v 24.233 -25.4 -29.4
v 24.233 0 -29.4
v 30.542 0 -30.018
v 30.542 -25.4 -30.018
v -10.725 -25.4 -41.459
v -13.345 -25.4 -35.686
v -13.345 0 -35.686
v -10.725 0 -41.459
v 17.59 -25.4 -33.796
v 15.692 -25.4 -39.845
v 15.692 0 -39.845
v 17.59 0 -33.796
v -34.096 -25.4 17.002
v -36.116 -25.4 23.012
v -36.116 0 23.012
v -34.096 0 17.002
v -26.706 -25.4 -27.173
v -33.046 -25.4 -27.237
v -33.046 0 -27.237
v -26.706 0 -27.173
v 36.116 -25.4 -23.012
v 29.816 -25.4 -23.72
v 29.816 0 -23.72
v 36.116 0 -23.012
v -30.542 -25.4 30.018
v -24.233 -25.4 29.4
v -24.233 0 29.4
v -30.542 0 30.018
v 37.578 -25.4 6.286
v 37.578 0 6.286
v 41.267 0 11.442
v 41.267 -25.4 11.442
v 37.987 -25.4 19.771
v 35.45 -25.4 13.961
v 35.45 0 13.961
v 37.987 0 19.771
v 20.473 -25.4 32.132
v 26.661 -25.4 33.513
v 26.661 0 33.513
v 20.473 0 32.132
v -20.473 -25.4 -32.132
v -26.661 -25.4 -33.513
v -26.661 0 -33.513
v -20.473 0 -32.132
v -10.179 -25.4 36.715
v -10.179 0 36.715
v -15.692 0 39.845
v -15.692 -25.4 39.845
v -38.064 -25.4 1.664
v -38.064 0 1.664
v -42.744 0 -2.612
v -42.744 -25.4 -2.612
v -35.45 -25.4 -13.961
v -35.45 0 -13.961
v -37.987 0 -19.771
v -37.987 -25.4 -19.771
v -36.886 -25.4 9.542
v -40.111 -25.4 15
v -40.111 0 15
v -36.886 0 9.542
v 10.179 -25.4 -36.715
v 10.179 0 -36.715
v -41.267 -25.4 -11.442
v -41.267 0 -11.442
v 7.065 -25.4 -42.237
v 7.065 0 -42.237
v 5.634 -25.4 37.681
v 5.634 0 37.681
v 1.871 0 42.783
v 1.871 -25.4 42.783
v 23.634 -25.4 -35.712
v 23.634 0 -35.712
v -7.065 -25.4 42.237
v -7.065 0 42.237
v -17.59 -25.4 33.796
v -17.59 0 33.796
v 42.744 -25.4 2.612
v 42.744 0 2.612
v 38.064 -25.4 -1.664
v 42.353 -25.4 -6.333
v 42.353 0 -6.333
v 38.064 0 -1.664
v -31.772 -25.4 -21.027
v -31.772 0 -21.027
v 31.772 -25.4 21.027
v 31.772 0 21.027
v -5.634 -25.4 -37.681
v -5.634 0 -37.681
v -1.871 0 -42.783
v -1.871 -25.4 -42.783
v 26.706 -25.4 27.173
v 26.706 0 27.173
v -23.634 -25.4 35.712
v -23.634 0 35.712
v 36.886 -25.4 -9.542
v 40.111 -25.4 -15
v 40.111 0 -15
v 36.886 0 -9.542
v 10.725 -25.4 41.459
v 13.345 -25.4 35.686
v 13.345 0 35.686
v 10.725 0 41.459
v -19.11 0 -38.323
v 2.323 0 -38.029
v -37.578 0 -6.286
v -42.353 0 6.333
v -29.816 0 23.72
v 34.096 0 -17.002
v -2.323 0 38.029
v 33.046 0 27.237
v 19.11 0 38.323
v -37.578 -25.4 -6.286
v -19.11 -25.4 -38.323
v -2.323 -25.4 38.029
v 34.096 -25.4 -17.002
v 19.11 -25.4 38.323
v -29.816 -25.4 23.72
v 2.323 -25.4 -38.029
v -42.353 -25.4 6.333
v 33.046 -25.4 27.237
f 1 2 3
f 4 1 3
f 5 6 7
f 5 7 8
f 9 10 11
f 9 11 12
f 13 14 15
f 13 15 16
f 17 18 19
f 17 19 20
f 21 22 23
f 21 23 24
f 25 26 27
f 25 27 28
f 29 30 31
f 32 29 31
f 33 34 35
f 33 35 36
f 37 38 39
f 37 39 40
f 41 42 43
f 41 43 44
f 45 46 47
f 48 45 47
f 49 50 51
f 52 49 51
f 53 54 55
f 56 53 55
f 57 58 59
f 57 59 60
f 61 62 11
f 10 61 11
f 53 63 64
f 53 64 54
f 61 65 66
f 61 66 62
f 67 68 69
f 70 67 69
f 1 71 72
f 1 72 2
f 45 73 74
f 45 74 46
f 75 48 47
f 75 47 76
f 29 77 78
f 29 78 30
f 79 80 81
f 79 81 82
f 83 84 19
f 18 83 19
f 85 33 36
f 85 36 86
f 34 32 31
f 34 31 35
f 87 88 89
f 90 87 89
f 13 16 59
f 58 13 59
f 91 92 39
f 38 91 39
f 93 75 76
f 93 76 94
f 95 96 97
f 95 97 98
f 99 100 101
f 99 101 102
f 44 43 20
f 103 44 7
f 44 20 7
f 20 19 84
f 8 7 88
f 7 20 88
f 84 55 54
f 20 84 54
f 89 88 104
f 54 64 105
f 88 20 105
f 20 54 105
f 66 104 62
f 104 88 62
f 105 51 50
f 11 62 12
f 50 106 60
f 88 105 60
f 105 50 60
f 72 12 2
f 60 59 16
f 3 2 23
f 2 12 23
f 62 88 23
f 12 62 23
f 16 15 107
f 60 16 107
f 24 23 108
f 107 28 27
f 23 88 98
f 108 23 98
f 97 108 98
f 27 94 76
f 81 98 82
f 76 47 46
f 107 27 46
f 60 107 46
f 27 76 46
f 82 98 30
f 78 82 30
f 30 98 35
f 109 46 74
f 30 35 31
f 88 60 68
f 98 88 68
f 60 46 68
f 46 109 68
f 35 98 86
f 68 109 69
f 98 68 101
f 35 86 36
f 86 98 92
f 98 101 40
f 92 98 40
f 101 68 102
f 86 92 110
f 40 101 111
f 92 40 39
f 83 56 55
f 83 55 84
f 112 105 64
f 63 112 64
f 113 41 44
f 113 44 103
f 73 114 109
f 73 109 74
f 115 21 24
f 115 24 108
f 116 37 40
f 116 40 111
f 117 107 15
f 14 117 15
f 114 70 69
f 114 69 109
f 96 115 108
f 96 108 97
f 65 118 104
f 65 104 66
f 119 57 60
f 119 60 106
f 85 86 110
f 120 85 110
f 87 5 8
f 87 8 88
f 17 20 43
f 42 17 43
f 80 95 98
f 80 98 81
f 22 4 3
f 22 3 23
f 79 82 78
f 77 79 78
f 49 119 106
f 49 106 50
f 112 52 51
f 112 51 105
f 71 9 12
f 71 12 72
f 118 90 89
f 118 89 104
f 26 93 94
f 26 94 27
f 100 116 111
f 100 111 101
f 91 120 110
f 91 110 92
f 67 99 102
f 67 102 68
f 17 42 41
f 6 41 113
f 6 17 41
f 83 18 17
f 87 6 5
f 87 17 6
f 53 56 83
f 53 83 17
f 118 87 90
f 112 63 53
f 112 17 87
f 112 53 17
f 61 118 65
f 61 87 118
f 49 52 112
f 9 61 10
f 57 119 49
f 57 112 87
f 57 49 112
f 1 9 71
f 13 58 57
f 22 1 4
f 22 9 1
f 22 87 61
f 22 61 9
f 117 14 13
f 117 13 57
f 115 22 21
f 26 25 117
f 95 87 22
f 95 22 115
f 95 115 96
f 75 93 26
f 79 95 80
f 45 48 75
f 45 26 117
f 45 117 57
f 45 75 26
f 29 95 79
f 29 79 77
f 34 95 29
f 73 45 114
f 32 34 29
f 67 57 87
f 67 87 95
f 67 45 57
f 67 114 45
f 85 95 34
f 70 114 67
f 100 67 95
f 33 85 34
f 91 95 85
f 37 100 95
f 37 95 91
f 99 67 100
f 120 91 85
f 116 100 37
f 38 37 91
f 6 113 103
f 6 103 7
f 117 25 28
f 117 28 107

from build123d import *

# Parameters (mm, degrees)
F0_R            = 38.1
F1_DEPTH        = 25.4
F3_DEPTH        = 25.4
F3_COPIES_COUNT = 30


# Not quite as in the source:
# - a pattern or mirror of a feature is missing from the dataset's text; its kind, count and spacing are read off the source's solid


with BuildPart() as f1:
    # F0 (on Front) → F1 (new body)
    with BuildSketch(Plane.XZ):
        Circle(F0_R)
    extrude(amount=F1_DEPTH)

    # F2 (on face) → F3 (join)
    with BuildSketch(Plane.XZ.offset(25.4)):
        with BuildLine():
            Line((1.8707504496, 42.7830666304), (-2.323463975, 38.0290877508))
            ThreePointArc((-2.323463975, 38.0290877508), (1.6643863058, 38.0636285478), (5.6340012219, 37.6811362651))
            Line((5.6340012219, 37.6811362651), (1.8707504496, 42.7830666304))
        make_face()
    f3 = extrude(amount=-F3_DEPTH)

    # F3_copies: F3 ×30 about axis
    f3_copies_axis = Axis((0, 0, 0), (0, 1, 0))
    for i in range(1, F3_COPIES_COUNT):
        add(f3.rotate(f3_copies_axis, i * 360 / F3_COPIES_COUNT))


solid = f1.part
